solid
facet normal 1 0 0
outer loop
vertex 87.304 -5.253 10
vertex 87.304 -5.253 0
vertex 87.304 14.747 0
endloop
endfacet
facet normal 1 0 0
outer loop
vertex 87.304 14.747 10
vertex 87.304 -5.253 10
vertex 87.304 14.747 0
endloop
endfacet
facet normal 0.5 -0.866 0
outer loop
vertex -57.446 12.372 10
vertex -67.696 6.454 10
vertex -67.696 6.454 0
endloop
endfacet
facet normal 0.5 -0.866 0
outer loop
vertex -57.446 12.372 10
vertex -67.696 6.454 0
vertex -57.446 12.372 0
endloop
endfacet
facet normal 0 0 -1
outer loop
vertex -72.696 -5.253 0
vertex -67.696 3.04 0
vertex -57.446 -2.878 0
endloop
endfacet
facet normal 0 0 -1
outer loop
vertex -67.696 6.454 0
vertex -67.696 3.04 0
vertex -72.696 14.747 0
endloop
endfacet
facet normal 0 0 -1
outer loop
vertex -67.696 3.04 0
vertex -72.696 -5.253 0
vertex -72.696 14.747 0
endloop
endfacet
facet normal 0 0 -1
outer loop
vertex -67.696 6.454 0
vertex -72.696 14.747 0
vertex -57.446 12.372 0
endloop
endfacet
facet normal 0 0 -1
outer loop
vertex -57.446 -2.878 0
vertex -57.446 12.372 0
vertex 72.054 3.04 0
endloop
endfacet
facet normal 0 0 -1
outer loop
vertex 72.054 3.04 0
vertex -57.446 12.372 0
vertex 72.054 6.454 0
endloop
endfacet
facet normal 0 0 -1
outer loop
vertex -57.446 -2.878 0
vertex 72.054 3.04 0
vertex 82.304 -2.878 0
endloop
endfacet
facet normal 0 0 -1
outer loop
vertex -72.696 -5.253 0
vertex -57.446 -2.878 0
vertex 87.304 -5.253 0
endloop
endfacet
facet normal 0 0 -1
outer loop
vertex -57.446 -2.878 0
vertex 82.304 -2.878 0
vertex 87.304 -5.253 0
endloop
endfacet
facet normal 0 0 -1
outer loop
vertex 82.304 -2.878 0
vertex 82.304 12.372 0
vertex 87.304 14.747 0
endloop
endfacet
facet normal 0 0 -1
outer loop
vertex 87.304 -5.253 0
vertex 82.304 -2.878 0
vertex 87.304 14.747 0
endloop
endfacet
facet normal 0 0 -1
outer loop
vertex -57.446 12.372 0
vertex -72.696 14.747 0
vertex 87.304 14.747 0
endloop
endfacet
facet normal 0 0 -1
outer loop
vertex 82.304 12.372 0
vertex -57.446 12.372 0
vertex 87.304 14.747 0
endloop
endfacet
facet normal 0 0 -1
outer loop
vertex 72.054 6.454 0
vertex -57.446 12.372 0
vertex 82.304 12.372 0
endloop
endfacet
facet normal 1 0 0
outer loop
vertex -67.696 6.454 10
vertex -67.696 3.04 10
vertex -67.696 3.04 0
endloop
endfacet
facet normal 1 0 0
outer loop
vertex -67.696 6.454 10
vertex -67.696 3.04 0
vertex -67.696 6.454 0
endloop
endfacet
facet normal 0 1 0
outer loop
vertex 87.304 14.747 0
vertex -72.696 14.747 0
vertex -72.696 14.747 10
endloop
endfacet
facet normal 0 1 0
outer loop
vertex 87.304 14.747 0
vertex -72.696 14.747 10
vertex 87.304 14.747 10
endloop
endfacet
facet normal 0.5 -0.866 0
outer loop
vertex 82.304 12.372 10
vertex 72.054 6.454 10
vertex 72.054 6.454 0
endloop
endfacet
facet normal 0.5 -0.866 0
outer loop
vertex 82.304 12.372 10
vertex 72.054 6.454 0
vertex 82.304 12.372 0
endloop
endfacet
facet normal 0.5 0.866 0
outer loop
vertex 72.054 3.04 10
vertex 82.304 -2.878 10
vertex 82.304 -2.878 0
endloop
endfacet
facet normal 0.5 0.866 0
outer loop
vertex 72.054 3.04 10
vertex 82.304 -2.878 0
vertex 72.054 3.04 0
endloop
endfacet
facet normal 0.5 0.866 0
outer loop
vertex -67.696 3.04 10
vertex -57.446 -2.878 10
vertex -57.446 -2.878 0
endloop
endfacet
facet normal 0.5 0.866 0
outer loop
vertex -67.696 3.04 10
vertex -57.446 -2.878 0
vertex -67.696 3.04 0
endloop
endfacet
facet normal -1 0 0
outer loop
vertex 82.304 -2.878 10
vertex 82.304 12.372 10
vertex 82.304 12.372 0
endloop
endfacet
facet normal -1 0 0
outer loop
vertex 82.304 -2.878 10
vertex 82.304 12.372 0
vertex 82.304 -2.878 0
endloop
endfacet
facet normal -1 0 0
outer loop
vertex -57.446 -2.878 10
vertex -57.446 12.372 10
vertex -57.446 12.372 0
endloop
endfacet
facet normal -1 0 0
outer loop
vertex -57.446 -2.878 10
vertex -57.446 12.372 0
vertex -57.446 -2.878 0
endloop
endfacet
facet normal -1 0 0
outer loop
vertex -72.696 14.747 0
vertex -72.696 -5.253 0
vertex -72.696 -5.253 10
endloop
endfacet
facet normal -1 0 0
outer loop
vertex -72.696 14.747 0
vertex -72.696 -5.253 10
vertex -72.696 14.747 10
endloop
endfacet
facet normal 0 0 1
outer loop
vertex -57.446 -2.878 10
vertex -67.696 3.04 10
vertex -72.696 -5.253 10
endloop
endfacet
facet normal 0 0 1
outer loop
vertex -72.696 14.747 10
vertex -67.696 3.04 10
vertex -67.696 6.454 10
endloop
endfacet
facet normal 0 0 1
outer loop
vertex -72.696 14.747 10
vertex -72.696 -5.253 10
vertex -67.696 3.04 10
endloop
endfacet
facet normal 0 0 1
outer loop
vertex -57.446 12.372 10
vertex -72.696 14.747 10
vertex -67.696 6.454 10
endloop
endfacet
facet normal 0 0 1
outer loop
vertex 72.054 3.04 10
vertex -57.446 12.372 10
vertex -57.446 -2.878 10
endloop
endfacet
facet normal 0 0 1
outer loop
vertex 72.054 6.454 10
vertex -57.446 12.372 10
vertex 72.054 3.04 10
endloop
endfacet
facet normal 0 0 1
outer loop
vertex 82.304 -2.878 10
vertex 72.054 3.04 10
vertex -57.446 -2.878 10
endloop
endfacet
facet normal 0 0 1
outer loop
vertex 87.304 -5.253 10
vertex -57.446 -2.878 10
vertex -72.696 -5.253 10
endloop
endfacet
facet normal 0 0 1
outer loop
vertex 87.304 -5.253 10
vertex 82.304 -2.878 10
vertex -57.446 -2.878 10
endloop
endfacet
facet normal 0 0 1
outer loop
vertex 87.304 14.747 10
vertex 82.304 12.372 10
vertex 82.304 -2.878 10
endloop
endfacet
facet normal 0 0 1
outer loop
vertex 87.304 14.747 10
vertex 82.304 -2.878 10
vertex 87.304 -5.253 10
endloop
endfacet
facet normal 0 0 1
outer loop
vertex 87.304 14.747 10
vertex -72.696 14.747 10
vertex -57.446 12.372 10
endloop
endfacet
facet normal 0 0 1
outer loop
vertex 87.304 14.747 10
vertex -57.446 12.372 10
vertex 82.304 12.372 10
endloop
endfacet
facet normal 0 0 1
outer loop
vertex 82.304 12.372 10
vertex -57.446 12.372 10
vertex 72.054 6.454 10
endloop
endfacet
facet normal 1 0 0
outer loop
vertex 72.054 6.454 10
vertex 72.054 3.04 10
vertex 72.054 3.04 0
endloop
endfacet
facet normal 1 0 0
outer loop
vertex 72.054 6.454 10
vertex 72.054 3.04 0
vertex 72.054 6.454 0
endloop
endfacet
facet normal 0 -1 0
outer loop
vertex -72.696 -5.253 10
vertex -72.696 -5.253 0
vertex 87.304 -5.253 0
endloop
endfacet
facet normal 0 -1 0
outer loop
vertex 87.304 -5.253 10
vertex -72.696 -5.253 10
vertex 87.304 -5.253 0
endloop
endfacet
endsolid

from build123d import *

# Parameters (mm, degrees)
SKETCH_W     = 160
SKETCH_H     = 20
PAD_DEPTH    = 10
POCKET_DEPTH = 10


with BuildPart() as part:
    # Sketch → Pad (new body)
    with BuildSketch(Plane.XY):
        with Locations((7.304336, 4.746988)):
            Rectangle(SKETCH_W, SKETCH_H)
    extrude(amount=PAD_DEPTH)

    # Sketch001 (on Face6 of Pad) → Pocket (cut)
    with BuildSketch(Plane.XY.offset(10)):
        Polygon((-67.695664, 3.039828), (-67.695664, 6.454148), (-57.445664, 12.371988), (-57.445664, -2.878012), align=None)
        Polygon((72.054336, 3.039828), (72.054336, 6.454148), (82.304336, 12.371988), (82.304336, -2.878012), align=None)
    extrude(amount=-POCKET_DEPTH, mode=Mode.SUBTRACT)


solid = part.part
